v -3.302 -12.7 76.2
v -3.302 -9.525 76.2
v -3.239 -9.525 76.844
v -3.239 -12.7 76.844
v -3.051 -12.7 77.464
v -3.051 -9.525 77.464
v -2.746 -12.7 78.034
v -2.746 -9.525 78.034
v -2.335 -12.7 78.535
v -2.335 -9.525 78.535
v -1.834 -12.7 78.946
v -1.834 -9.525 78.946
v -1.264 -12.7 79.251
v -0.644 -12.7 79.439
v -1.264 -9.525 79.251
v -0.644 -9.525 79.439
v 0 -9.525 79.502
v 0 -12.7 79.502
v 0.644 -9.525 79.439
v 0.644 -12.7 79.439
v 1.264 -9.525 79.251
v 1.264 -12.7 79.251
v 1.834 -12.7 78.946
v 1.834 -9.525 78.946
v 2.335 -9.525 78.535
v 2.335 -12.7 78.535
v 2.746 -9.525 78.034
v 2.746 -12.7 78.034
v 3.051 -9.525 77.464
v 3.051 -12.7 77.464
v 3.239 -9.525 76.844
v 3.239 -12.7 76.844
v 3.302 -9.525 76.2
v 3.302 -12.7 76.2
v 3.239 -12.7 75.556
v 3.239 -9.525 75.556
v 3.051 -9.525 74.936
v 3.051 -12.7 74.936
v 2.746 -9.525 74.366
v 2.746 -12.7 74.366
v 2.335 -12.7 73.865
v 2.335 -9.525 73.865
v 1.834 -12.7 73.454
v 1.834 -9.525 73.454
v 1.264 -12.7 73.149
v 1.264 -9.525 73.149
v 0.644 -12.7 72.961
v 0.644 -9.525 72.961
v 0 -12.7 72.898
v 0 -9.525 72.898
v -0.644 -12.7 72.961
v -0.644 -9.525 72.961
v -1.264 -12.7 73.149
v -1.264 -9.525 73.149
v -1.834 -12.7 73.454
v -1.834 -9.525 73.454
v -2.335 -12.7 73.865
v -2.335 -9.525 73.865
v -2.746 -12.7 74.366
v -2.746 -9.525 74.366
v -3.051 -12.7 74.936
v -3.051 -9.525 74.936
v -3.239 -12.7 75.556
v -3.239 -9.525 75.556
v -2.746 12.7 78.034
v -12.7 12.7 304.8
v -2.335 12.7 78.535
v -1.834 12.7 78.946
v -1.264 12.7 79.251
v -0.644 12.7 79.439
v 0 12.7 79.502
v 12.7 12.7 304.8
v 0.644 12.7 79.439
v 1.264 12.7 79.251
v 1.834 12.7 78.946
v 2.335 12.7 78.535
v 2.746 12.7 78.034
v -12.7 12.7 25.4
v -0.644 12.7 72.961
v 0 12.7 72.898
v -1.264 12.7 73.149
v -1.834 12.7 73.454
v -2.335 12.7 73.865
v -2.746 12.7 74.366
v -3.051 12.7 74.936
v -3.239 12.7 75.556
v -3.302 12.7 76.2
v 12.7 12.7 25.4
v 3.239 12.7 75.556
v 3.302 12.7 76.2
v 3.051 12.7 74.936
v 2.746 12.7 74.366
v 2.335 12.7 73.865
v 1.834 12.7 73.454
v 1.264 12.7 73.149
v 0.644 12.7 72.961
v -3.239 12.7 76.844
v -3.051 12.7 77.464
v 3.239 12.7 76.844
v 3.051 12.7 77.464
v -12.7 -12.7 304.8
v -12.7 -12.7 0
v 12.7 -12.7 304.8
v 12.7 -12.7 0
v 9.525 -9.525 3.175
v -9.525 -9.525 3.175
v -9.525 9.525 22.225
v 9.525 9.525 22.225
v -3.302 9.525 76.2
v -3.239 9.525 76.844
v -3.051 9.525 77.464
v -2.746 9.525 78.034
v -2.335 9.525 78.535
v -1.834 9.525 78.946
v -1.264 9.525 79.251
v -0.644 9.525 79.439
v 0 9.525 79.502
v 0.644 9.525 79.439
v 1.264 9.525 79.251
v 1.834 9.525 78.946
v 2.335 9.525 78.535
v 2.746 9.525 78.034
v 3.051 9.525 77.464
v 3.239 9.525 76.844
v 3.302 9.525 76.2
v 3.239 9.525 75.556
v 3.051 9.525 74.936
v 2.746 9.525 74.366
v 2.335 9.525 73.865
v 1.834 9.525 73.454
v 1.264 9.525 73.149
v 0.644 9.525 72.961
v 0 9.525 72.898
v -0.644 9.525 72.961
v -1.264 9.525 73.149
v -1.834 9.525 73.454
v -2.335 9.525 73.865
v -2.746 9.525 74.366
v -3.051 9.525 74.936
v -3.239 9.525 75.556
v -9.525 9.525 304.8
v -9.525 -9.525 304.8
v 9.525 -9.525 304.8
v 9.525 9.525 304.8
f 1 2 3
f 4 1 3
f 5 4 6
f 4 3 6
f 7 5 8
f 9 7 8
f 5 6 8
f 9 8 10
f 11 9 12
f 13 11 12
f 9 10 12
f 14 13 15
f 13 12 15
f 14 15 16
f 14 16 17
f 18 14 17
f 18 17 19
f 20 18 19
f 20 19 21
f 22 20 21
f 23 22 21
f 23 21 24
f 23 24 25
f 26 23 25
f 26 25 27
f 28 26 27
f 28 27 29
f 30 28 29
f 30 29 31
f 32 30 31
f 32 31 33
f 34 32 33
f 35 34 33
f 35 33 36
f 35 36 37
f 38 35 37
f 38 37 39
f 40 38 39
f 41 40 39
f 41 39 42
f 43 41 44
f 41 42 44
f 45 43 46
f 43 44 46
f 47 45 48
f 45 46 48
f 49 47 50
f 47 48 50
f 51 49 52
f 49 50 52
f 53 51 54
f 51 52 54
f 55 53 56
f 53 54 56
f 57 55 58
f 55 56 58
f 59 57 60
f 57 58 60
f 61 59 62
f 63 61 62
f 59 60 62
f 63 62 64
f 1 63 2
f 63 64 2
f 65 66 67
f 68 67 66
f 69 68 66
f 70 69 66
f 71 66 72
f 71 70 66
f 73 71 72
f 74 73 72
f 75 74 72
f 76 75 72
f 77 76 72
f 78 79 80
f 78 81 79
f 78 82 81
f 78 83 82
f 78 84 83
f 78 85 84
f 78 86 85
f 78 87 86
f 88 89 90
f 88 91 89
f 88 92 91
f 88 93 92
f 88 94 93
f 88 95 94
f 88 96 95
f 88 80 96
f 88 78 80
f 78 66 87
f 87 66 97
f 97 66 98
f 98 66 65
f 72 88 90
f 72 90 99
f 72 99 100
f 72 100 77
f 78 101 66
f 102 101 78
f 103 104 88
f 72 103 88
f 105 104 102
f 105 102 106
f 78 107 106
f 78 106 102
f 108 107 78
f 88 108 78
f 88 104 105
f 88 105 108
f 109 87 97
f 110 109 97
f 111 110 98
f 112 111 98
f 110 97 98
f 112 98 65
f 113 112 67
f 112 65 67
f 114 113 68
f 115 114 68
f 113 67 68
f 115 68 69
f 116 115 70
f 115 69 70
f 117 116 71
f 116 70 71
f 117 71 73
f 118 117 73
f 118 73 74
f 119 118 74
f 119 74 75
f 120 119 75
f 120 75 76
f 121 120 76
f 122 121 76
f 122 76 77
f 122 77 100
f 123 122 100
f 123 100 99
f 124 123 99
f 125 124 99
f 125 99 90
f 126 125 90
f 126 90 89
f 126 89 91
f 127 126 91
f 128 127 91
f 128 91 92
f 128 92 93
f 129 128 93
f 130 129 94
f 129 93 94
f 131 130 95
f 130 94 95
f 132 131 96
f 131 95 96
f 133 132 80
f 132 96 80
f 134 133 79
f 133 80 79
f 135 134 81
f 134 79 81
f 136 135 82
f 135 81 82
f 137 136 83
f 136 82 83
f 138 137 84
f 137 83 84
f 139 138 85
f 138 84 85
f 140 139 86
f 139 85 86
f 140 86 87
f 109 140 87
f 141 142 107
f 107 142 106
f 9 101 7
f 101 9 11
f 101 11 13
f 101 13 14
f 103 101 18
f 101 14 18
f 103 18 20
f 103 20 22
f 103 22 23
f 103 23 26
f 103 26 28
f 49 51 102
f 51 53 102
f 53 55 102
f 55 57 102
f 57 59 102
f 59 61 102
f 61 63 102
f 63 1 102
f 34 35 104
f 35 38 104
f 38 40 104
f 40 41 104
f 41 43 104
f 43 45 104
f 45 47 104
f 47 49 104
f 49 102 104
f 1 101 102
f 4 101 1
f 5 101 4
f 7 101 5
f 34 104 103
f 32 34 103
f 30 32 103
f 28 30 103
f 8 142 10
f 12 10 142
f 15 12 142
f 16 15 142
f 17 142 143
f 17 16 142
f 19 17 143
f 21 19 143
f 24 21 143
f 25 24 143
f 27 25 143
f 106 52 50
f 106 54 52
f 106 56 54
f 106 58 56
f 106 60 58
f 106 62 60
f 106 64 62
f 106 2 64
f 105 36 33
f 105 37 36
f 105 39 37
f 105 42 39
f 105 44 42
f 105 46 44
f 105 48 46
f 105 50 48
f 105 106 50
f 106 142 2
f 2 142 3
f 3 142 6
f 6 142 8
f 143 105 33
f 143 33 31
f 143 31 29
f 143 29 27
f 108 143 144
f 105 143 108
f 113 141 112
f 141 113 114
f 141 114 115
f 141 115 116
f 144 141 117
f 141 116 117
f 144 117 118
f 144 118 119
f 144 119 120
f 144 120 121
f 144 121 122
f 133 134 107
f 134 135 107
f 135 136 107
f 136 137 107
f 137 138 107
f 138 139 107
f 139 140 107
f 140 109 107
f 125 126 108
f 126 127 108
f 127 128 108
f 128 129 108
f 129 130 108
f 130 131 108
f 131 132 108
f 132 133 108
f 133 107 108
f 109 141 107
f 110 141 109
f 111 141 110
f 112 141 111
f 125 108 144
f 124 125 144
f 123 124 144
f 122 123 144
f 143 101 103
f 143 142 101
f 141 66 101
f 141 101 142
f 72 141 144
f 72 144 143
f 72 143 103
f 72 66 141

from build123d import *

# Parameters (mm, degrees)
SKETCH1_W           = 25.4
SKETCH1_H           = 25.4
SKETCH1_W_2         = 19.05
SKETCH1_H_2         = 19.05
BOSS_EXTRUDE1_DEPTH = 304.8
CUT_EXTRUDE1_DEPTH  = 307.120058147
SKETCH3_R           = 3.302
CUT_EXTRUDE2_DEPTH  = 307.120058147


with BuildPart() as part:
    # Sketch1 → Boss-Extrude1 (new body)
    with BuildSketch(Plane.XY):
        Rectangle(SKETCH1_W, SKETCH1_H)
        Rectangle(SKETCH1_W_2, SKETCH1_H_2, mode=Mode.SUBTRACT)
    extrude(amount=BOSS_EXTRUDE1_DEPTH)

    # Sketch2 → Cut-Extrude1 (cut, through all)
    with BuildSketch(Plane(origin=(12.7, 0, 0), x_dir=(0, 0, -1), z_dir=(1, 0, 0))):
        Polygon((0, 12.7), (0, -12.7), (-25.4, 12.7), align=None)
    extrude(amount=-CUT_EXTRUDE1_DEPTH, mode=Mode.SUBTRACT)

    # Sketch3 → Cut-Extrude2 (cut, through all)
    with BuildSketch(Plane(origin=(0, 12.7, 0), x_dir=(1, 0, 0), z_dir=(0, 1, 0))):
        with Locations(Location((0, -76.2, 0), (0, 0, 180))):
            Circle(SKETCH3_R)
    extrude(amount=-CUT_EXTRUDE2_DEPTH, mode=Mode.SUBTRACT)


solid = part.part
